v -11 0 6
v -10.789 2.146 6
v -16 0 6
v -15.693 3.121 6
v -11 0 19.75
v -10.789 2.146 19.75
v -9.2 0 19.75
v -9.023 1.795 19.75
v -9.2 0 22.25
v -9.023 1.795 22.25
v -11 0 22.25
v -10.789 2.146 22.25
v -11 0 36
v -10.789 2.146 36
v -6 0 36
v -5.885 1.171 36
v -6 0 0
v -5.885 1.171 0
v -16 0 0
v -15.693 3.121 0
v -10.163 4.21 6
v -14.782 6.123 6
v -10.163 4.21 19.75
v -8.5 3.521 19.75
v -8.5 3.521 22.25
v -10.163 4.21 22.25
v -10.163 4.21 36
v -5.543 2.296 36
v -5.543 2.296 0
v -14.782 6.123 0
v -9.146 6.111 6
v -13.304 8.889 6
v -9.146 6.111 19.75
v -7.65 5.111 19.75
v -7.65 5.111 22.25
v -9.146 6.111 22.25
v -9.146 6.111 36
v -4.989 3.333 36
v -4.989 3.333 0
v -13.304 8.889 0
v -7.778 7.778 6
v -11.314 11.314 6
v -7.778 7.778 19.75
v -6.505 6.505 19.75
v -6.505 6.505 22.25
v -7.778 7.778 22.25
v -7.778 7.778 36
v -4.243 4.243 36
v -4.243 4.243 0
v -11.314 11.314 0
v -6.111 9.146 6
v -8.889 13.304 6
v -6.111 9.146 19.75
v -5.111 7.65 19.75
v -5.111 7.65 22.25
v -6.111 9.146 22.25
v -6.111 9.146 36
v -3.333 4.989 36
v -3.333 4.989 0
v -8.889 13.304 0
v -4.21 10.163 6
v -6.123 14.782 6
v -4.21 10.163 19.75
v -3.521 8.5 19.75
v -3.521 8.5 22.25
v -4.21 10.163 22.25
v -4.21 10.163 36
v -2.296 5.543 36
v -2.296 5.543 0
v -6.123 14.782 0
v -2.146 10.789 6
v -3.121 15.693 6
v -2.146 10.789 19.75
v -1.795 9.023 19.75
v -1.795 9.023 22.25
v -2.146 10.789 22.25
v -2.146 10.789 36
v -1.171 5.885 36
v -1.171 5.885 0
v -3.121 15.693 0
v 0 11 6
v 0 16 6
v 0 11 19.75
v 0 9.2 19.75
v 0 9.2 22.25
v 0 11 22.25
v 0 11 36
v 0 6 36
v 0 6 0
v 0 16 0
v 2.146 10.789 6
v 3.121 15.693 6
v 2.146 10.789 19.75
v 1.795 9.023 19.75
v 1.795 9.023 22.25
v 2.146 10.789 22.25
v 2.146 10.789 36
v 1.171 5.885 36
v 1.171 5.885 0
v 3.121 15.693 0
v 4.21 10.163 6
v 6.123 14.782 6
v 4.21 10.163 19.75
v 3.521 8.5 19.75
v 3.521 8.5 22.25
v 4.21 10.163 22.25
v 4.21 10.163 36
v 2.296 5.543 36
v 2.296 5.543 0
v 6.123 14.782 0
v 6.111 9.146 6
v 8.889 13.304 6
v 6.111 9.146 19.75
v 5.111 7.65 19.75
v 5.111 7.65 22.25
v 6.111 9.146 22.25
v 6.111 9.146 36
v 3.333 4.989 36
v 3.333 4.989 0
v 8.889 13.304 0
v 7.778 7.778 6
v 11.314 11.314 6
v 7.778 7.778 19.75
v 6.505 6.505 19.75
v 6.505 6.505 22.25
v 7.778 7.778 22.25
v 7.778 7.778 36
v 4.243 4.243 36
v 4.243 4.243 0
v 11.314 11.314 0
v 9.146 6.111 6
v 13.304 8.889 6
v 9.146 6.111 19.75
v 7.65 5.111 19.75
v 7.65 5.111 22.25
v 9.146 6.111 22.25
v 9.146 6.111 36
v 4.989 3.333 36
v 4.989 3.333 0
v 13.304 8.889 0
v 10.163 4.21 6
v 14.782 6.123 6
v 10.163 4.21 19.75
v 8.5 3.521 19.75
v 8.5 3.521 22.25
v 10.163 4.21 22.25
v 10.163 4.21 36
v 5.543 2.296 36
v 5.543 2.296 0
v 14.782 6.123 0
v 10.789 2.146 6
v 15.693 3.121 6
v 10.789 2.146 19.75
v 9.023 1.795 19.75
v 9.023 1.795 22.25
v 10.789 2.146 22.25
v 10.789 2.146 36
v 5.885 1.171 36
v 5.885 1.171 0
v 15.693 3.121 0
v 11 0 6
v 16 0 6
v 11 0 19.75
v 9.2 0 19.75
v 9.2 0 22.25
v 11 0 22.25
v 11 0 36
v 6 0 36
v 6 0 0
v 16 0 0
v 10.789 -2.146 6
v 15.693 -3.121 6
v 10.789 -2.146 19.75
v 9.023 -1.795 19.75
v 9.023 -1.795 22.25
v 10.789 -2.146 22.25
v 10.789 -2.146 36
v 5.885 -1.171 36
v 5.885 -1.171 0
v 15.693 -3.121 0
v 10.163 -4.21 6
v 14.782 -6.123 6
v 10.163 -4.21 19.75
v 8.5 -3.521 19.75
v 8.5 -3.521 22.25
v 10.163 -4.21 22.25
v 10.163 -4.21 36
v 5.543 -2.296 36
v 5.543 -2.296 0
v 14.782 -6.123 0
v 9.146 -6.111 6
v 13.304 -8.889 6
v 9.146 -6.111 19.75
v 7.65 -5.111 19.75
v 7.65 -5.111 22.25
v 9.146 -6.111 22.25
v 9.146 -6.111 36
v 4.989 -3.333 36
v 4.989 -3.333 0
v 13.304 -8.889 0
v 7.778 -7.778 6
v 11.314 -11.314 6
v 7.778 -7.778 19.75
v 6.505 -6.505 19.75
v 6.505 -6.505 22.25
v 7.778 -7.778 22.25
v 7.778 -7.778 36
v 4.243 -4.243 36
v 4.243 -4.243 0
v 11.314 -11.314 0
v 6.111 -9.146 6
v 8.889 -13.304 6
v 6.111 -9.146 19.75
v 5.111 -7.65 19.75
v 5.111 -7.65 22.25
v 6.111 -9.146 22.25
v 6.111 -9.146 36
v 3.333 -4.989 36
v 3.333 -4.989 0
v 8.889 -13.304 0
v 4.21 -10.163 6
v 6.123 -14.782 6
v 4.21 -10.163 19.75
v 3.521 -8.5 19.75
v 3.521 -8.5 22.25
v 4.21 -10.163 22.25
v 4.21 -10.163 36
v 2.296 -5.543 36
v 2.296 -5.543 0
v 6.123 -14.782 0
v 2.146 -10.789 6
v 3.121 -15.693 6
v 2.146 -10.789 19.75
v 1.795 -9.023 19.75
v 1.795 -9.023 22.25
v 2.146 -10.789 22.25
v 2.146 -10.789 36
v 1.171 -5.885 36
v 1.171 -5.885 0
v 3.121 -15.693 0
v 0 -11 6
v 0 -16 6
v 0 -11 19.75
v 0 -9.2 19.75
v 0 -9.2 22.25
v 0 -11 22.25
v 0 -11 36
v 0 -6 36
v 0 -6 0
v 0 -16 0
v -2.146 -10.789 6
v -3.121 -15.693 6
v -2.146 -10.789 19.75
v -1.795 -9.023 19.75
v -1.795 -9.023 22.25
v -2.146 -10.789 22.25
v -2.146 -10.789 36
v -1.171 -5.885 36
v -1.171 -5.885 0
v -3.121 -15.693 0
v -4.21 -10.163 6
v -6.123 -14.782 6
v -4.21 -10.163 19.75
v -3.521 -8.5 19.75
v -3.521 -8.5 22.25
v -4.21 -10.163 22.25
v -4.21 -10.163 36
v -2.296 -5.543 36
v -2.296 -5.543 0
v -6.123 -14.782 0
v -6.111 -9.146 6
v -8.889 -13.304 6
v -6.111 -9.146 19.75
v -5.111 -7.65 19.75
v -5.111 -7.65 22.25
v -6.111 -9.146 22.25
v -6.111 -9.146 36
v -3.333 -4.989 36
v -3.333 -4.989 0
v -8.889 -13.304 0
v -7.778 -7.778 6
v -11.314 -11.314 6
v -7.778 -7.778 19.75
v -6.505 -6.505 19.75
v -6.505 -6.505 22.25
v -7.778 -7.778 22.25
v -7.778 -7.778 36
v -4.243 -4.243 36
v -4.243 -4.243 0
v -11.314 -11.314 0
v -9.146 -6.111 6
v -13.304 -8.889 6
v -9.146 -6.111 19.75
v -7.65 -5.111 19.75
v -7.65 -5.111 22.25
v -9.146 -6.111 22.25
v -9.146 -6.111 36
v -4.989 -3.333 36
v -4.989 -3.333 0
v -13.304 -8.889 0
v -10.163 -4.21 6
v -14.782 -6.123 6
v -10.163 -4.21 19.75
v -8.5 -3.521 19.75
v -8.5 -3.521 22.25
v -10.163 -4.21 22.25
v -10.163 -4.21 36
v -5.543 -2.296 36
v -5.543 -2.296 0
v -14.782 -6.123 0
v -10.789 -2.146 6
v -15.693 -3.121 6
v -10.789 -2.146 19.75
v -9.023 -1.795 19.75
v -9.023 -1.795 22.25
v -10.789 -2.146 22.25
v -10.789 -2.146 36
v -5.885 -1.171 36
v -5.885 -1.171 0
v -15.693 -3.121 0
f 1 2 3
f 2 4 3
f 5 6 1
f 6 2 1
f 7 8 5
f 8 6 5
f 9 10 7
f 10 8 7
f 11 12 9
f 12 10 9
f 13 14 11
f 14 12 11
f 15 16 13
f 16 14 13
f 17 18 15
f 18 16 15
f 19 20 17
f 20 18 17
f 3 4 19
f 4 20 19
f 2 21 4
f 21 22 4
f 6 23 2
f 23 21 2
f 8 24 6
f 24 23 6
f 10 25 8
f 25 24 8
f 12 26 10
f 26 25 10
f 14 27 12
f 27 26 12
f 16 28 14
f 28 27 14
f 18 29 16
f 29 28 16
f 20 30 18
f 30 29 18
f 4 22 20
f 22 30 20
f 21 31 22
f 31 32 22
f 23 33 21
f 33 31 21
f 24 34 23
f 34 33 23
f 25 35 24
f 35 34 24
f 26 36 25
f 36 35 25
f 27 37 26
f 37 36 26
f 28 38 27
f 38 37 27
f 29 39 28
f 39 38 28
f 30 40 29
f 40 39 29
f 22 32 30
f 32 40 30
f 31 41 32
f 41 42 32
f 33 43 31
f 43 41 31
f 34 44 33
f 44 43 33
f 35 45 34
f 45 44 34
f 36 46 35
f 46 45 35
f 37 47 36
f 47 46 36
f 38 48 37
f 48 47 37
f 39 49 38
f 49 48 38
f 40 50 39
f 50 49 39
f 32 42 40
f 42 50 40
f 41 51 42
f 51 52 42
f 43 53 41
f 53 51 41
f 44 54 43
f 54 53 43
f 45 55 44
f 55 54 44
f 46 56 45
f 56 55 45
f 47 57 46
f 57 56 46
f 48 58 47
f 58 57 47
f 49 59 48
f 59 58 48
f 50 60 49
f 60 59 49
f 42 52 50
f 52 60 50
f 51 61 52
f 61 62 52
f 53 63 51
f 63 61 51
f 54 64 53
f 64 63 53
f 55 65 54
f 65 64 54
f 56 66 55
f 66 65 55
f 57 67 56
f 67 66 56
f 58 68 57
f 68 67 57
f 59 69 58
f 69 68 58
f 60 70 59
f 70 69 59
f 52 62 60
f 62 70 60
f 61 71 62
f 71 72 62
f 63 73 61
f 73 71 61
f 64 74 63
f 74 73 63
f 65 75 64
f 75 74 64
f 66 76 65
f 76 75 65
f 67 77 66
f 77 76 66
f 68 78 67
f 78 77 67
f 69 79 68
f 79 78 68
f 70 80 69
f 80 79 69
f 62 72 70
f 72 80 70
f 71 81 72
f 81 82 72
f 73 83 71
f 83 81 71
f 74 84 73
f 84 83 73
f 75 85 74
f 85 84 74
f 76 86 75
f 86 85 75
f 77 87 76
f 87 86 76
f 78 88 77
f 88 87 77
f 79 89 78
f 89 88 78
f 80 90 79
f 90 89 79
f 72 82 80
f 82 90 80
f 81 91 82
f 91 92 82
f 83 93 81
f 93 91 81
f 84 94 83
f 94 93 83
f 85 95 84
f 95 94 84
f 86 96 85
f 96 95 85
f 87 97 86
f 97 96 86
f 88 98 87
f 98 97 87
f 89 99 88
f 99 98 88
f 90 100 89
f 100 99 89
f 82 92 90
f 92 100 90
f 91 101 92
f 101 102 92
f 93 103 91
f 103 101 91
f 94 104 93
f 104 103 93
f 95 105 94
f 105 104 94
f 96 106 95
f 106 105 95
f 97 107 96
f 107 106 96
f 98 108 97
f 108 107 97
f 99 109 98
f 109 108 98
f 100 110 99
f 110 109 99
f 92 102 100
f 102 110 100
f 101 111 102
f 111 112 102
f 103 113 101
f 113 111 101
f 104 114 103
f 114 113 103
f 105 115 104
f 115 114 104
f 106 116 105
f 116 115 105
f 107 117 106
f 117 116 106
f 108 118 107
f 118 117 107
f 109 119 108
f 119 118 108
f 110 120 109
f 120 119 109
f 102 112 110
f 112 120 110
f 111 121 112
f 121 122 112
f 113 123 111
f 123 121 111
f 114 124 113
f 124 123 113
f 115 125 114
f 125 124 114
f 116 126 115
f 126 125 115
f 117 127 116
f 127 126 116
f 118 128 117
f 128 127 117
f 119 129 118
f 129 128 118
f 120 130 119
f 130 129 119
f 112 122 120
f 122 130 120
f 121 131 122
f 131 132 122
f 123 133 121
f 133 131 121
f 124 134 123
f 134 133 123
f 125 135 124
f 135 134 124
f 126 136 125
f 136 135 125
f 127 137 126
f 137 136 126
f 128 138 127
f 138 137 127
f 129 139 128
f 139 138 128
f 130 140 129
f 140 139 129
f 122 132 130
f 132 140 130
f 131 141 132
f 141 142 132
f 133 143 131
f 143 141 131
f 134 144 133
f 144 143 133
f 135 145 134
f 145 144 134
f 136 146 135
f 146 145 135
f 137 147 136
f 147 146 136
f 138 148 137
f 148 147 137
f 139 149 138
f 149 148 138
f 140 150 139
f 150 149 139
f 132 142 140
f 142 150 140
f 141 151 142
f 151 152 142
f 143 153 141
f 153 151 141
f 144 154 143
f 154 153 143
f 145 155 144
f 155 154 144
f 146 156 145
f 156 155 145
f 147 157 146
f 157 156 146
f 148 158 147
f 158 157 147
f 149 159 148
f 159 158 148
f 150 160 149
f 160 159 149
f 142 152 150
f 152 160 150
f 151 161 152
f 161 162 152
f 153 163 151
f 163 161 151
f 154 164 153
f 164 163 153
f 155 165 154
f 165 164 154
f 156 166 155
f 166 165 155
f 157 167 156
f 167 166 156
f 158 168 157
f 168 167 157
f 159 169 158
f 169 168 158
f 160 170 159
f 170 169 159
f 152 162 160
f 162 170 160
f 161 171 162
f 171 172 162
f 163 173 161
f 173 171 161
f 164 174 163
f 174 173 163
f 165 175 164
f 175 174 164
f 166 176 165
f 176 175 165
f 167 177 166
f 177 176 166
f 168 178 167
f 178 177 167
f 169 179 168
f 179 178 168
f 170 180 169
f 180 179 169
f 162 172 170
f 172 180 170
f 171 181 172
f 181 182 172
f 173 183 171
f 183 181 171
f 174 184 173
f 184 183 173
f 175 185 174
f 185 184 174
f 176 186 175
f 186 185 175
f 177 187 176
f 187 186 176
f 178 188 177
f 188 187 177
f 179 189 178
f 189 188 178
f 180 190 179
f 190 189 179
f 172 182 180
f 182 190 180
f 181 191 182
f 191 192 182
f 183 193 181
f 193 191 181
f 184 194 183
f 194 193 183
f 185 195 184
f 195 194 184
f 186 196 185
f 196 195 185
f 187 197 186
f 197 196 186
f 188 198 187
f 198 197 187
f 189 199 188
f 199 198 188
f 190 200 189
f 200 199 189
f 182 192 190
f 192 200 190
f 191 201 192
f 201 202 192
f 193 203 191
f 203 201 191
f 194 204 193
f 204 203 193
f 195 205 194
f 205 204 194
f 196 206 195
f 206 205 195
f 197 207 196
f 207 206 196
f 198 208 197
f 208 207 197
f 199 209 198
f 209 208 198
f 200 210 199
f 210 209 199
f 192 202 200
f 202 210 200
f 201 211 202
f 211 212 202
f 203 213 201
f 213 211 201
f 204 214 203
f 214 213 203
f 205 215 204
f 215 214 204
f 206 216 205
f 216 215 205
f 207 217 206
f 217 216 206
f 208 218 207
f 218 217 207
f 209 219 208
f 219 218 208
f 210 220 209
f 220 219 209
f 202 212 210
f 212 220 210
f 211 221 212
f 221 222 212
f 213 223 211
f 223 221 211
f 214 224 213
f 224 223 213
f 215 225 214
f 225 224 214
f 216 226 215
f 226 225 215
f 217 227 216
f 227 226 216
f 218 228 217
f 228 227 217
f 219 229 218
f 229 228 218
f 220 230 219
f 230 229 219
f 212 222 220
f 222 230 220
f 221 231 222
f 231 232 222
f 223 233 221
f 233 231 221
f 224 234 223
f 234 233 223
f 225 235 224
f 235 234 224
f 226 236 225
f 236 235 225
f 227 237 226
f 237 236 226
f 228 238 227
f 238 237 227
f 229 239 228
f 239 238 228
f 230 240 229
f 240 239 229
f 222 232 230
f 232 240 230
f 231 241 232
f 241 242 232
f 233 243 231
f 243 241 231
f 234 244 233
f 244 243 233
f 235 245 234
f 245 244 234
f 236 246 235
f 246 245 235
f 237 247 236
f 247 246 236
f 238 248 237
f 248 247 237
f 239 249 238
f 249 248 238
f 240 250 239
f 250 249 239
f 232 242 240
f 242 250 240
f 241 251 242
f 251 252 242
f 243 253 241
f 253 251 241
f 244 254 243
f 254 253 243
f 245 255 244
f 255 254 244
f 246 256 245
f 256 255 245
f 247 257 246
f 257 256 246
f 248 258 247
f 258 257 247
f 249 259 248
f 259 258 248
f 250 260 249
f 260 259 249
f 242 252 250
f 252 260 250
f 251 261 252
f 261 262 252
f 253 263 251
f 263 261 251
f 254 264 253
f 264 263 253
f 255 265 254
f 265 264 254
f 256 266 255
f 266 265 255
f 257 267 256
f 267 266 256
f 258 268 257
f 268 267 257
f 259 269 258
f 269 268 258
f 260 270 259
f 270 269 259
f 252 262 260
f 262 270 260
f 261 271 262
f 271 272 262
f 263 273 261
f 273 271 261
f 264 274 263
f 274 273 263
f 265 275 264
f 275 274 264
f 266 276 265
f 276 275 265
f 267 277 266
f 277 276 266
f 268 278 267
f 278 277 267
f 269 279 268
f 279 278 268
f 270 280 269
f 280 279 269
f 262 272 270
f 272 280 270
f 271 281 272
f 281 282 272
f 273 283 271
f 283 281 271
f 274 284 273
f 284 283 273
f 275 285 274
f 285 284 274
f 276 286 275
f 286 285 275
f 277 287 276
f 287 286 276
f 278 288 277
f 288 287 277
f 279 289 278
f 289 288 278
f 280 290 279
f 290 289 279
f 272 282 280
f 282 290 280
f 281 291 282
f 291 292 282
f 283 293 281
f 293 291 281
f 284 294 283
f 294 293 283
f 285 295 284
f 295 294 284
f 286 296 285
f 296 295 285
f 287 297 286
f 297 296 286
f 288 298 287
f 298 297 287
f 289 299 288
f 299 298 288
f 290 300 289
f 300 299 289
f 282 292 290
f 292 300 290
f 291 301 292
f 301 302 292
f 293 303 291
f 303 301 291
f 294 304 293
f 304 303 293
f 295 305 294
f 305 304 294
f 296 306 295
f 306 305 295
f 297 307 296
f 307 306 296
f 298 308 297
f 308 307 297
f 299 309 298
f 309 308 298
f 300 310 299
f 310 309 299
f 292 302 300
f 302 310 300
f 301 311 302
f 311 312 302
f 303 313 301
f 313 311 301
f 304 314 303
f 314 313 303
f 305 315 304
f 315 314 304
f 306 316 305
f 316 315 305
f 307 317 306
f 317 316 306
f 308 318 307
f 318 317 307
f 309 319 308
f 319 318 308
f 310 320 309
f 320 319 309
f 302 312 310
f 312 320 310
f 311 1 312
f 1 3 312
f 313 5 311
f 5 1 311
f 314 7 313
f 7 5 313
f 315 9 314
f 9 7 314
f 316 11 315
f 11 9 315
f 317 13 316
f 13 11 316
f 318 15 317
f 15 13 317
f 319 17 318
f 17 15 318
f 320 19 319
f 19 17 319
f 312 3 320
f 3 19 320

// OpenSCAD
$fn = 32;

// ----------------------------------------------------------------------
// Grooved revolve: flanged, bore R6
// ----------------------------------------------------------------------

// --- parameters (mm) ---
bore_r = 6;               // bore radius
outer_r = 11;             // outer radius of the body
total_h = 36;             // overall height, Z
wall = 5;                 // radial wall thickness
groove_w = 2.5;           // groove width
groove_d = 1.8;           // groove depth
grooves = 1;              // number of outer grooves
flange_r = 16;            // flange radius
flange_h = 6;             // flange height

bbox_x = 2 * flange_r;  // full diameter
bore_d = 2 * bore_r;  // bore diameter
body_d = 2 * outer_r;  // body diameter
flange_d = 2 * flange_r;  // flange diameter
revolve_angle = 360;  // full turn around the Z axis

profile = [[6, 0], [11, 0], [16, 0], [16, 6], [11, 6], [11, 19.75], [9.2, 19.75], [9.2, 22.25], [11, 22.25], [11, 36], [6, 36]];  // primary outline, 11 points, counter clockwise

// --- the one profile operation ---
rotate_extrude(angle = revolve_angle) polygon(points = profile);
